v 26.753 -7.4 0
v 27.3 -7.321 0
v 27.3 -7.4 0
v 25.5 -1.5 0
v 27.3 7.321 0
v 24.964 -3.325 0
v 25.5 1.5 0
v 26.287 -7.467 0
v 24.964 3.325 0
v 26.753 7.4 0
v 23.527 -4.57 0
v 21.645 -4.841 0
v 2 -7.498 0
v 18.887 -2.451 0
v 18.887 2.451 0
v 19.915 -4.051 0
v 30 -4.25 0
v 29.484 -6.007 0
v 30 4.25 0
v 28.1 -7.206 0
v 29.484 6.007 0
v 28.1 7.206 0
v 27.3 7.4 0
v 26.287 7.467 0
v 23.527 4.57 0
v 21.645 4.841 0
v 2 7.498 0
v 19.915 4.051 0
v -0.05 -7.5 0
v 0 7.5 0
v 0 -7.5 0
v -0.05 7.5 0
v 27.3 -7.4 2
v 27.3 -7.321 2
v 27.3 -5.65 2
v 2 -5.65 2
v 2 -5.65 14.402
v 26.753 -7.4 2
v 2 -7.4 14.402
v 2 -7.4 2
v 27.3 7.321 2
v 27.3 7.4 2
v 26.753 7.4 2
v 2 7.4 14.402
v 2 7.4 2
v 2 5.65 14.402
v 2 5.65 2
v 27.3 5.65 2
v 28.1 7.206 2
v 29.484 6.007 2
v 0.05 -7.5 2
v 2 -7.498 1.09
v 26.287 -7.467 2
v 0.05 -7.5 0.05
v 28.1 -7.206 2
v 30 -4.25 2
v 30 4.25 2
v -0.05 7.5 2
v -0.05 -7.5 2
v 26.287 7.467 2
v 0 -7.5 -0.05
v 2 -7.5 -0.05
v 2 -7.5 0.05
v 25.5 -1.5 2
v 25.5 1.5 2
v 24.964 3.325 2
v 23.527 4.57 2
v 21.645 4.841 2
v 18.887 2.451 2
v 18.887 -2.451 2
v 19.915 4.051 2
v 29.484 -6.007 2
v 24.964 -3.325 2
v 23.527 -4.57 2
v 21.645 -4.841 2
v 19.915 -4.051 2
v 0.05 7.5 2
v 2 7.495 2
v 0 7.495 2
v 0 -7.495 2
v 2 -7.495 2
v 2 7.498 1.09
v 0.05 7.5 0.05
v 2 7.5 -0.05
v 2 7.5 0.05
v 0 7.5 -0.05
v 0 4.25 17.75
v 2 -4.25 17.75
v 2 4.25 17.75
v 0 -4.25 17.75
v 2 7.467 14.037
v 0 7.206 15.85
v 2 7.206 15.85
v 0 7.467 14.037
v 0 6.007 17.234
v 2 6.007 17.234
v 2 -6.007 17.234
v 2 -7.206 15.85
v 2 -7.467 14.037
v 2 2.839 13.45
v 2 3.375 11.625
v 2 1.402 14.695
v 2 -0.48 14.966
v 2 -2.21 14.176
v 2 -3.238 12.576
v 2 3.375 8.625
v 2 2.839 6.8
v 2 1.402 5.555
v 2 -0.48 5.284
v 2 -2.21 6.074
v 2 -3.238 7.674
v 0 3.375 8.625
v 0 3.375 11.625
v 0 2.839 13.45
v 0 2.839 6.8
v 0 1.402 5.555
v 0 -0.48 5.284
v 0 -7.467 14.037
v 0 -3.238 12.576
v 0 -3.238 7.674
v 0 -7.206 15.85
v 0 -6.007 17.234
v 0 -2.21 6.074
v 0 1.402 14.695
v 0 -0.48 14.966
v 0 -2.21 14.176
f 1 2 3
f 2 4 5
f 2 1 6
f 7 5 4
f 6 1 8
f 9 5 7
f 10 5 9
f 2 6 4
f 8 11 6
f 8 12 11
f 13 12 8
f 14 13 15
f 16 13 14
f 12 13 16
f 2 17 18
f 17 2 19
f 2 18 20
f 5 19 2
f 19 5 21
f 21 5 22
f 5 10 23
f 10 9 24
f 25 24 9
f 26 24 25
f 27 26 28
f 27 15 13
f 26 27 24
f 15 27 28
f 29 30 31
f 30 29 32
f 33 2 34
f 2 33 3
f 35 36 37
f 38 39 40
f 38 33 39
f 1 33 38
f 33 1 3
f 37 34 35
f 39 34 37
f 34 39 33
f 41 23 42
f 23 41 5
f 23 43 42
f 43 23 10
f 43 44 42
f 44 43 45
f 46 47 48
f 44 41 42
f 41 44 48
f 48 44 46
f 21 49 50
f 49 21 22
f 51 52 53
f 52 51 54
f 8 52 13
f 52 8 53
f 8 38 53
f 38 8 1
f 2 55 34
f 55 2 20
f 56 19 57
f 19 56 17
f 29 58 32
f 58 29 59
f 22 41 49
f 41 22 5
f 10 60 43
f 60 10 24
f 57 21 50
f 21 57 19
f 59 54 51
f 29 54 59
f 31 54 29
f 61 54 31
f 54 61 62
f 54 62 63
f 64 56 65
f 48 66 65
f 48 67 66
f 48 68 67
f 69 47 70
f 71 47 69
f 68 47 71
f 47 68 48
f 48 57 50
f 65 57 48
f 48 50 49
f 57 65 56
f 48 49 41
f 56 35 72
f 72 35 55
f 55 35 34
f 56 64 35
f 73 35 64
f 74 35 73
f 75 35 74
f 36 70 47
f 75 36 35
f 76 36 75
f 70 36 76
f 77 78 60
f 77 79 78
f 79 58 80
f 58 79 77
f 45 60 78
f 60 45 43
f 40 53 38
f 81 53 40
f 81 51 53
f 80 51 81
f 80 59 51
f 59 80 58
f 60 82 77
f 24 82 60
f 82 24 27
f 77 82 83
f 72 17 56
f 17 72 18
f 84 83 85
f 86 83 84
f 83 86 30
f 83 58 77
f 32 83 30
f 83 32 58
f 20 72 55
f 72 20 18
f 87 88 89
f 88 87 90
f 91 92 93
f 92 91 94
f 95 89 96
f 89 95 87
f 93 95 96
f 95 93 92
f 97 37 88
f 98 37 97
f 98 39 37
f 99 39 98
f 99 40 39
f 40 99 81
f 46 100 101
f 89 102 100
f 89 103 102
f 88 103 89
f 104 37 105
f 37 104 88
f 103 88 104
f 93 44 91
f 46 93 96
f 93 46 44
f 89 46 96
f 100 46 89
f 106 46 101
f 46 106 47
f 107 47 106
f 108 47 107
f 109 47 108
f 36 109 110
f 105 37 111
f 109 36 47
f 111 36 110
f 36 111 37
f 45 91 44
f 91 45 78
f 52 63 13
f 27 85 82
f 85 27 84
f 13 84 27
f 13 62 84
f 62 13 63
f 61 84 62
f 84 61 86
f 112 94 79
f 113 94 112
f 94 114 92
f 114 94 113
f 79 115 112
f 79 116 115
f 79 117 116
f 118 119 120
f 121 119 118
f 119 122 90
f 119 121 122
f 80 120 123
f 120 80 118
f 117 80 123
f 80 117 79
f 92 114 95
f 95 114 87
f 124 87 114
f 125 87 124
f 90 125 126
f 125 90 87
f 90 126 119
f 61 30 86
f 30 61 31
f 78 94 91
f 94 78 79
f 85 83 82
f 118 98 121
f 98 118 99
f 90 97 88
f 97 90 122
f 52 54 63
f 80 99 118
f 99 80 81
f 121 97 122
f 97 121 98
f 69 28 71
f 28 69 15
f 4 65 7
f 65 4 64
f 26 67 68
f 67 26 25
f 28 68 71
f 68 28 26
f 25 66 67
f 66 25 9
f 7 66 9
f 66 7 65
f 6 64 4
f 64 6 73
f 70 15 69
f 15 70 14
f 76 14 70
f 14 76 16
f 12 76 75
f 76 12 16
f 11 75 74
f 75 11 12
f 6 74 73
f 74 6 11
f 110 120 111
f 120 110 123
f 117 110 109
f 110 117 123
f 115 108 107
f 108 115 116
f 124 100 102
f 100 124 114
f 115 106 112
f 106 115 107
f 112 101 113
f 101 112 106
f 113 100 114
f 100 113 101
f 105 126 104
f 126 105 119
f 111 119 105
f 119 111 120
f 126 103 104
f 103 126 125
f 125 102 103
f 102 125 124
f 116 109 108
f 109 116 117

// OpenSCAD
// [FL_INDEX: keywords="openscad, 3d_parametric, Customizable_Shelf_Drawer_Bracket, csg_solid" | COT="Parametric OpenSCAD design from 3DCodeverse"]
// Title: Customizable Shelf/Drawer Bracket

//********************************************************************
//********************************************************************
//Simple drawer or shelf bracket
//by Marc Sulfridge
//********************************************************************
//********************************************************************

//********************************************************************
//User defined parameters
//********************************************************************
//Width of bracket.
width = 15; // [2:25]
//Lenght of side reinforcement triangles.
side_len = 27.5; // [5:50]
//Height of side reinforcement triangles.
side_ht = 14.5; // [5:50]
//Length of horizontal base.
length = 30; // [5:50]
//Height of vertical base.
up_ht = 17.75; // [5:50]
//Thickness of base and side.
thick = 2; // [0.25:2.5]
//Thickness of side reinforcement triangles.
side_thk = 1.75; // [0.25:2.5]
//Radius of corner fillets.
fillet_rad = 3.25; // [0.5:5]
//Distance between end of horizontal base and center of horizontal hole.
base_hole_gap = 4.5; // [1:10]
//Distance between top of vertical base and center of vertical hole.
side_hole_gap = 5.25; // [1:10]
//Short axis (diameter) of screw holes.
hole_dia = 6.75; // [1:10]
//Long axis (length) of screw holes.
hole_wid = 9.75; // [2:20]
//Fudge factor to ensure overlaps.
dt = 0.1; // [0.001,0.01,0.1]
//********************************************************************

module hole(){
	hull(){
		for (i=[-1,1]){
			translate([0,i*(hole_wid-hole_dia)/2,-dt/2])
			cylinder(r=hole_dia/2,h=thick+dt,center=false);
		}
	}
}

module side(){
	hull(){
		cube([dt,side_thk,side_ht], center=false);

		translate([side_len-thick,0,0])
		cube([dt,side_thk,thick], center=false);
	}
}

module base(long){
	translate([0,0,thick/2])
	hull(){
		cube([dt,width,thick], center=true);
		
		for (i=[-1,1]){
			translate([long-fillet_rad,i*(width/2-fillet_rad),0])
			cylinder(r=fillet_rad,h=thick,center=true);
		}
	}
}

module upright(long){
	translate([thick,0,0])
	rotate([0,-90,0])
	base(long);
}

difference(){
	union(){
		base(length);
		upright(up_ht);
		
		for (i=[-width/2+dt, width/2-side_thk-dt]){
			translate([thick-3*dt,i,0])
			side();
		}
	}

	translate([length-base_hole_gap-hole_dia/2,0,0])
	hole();

	translate([thick,0,side_hole_gap+hole_wid/2])
	rotate([0,-90,0])
	rotate([0,0,90])
	hole();
}
